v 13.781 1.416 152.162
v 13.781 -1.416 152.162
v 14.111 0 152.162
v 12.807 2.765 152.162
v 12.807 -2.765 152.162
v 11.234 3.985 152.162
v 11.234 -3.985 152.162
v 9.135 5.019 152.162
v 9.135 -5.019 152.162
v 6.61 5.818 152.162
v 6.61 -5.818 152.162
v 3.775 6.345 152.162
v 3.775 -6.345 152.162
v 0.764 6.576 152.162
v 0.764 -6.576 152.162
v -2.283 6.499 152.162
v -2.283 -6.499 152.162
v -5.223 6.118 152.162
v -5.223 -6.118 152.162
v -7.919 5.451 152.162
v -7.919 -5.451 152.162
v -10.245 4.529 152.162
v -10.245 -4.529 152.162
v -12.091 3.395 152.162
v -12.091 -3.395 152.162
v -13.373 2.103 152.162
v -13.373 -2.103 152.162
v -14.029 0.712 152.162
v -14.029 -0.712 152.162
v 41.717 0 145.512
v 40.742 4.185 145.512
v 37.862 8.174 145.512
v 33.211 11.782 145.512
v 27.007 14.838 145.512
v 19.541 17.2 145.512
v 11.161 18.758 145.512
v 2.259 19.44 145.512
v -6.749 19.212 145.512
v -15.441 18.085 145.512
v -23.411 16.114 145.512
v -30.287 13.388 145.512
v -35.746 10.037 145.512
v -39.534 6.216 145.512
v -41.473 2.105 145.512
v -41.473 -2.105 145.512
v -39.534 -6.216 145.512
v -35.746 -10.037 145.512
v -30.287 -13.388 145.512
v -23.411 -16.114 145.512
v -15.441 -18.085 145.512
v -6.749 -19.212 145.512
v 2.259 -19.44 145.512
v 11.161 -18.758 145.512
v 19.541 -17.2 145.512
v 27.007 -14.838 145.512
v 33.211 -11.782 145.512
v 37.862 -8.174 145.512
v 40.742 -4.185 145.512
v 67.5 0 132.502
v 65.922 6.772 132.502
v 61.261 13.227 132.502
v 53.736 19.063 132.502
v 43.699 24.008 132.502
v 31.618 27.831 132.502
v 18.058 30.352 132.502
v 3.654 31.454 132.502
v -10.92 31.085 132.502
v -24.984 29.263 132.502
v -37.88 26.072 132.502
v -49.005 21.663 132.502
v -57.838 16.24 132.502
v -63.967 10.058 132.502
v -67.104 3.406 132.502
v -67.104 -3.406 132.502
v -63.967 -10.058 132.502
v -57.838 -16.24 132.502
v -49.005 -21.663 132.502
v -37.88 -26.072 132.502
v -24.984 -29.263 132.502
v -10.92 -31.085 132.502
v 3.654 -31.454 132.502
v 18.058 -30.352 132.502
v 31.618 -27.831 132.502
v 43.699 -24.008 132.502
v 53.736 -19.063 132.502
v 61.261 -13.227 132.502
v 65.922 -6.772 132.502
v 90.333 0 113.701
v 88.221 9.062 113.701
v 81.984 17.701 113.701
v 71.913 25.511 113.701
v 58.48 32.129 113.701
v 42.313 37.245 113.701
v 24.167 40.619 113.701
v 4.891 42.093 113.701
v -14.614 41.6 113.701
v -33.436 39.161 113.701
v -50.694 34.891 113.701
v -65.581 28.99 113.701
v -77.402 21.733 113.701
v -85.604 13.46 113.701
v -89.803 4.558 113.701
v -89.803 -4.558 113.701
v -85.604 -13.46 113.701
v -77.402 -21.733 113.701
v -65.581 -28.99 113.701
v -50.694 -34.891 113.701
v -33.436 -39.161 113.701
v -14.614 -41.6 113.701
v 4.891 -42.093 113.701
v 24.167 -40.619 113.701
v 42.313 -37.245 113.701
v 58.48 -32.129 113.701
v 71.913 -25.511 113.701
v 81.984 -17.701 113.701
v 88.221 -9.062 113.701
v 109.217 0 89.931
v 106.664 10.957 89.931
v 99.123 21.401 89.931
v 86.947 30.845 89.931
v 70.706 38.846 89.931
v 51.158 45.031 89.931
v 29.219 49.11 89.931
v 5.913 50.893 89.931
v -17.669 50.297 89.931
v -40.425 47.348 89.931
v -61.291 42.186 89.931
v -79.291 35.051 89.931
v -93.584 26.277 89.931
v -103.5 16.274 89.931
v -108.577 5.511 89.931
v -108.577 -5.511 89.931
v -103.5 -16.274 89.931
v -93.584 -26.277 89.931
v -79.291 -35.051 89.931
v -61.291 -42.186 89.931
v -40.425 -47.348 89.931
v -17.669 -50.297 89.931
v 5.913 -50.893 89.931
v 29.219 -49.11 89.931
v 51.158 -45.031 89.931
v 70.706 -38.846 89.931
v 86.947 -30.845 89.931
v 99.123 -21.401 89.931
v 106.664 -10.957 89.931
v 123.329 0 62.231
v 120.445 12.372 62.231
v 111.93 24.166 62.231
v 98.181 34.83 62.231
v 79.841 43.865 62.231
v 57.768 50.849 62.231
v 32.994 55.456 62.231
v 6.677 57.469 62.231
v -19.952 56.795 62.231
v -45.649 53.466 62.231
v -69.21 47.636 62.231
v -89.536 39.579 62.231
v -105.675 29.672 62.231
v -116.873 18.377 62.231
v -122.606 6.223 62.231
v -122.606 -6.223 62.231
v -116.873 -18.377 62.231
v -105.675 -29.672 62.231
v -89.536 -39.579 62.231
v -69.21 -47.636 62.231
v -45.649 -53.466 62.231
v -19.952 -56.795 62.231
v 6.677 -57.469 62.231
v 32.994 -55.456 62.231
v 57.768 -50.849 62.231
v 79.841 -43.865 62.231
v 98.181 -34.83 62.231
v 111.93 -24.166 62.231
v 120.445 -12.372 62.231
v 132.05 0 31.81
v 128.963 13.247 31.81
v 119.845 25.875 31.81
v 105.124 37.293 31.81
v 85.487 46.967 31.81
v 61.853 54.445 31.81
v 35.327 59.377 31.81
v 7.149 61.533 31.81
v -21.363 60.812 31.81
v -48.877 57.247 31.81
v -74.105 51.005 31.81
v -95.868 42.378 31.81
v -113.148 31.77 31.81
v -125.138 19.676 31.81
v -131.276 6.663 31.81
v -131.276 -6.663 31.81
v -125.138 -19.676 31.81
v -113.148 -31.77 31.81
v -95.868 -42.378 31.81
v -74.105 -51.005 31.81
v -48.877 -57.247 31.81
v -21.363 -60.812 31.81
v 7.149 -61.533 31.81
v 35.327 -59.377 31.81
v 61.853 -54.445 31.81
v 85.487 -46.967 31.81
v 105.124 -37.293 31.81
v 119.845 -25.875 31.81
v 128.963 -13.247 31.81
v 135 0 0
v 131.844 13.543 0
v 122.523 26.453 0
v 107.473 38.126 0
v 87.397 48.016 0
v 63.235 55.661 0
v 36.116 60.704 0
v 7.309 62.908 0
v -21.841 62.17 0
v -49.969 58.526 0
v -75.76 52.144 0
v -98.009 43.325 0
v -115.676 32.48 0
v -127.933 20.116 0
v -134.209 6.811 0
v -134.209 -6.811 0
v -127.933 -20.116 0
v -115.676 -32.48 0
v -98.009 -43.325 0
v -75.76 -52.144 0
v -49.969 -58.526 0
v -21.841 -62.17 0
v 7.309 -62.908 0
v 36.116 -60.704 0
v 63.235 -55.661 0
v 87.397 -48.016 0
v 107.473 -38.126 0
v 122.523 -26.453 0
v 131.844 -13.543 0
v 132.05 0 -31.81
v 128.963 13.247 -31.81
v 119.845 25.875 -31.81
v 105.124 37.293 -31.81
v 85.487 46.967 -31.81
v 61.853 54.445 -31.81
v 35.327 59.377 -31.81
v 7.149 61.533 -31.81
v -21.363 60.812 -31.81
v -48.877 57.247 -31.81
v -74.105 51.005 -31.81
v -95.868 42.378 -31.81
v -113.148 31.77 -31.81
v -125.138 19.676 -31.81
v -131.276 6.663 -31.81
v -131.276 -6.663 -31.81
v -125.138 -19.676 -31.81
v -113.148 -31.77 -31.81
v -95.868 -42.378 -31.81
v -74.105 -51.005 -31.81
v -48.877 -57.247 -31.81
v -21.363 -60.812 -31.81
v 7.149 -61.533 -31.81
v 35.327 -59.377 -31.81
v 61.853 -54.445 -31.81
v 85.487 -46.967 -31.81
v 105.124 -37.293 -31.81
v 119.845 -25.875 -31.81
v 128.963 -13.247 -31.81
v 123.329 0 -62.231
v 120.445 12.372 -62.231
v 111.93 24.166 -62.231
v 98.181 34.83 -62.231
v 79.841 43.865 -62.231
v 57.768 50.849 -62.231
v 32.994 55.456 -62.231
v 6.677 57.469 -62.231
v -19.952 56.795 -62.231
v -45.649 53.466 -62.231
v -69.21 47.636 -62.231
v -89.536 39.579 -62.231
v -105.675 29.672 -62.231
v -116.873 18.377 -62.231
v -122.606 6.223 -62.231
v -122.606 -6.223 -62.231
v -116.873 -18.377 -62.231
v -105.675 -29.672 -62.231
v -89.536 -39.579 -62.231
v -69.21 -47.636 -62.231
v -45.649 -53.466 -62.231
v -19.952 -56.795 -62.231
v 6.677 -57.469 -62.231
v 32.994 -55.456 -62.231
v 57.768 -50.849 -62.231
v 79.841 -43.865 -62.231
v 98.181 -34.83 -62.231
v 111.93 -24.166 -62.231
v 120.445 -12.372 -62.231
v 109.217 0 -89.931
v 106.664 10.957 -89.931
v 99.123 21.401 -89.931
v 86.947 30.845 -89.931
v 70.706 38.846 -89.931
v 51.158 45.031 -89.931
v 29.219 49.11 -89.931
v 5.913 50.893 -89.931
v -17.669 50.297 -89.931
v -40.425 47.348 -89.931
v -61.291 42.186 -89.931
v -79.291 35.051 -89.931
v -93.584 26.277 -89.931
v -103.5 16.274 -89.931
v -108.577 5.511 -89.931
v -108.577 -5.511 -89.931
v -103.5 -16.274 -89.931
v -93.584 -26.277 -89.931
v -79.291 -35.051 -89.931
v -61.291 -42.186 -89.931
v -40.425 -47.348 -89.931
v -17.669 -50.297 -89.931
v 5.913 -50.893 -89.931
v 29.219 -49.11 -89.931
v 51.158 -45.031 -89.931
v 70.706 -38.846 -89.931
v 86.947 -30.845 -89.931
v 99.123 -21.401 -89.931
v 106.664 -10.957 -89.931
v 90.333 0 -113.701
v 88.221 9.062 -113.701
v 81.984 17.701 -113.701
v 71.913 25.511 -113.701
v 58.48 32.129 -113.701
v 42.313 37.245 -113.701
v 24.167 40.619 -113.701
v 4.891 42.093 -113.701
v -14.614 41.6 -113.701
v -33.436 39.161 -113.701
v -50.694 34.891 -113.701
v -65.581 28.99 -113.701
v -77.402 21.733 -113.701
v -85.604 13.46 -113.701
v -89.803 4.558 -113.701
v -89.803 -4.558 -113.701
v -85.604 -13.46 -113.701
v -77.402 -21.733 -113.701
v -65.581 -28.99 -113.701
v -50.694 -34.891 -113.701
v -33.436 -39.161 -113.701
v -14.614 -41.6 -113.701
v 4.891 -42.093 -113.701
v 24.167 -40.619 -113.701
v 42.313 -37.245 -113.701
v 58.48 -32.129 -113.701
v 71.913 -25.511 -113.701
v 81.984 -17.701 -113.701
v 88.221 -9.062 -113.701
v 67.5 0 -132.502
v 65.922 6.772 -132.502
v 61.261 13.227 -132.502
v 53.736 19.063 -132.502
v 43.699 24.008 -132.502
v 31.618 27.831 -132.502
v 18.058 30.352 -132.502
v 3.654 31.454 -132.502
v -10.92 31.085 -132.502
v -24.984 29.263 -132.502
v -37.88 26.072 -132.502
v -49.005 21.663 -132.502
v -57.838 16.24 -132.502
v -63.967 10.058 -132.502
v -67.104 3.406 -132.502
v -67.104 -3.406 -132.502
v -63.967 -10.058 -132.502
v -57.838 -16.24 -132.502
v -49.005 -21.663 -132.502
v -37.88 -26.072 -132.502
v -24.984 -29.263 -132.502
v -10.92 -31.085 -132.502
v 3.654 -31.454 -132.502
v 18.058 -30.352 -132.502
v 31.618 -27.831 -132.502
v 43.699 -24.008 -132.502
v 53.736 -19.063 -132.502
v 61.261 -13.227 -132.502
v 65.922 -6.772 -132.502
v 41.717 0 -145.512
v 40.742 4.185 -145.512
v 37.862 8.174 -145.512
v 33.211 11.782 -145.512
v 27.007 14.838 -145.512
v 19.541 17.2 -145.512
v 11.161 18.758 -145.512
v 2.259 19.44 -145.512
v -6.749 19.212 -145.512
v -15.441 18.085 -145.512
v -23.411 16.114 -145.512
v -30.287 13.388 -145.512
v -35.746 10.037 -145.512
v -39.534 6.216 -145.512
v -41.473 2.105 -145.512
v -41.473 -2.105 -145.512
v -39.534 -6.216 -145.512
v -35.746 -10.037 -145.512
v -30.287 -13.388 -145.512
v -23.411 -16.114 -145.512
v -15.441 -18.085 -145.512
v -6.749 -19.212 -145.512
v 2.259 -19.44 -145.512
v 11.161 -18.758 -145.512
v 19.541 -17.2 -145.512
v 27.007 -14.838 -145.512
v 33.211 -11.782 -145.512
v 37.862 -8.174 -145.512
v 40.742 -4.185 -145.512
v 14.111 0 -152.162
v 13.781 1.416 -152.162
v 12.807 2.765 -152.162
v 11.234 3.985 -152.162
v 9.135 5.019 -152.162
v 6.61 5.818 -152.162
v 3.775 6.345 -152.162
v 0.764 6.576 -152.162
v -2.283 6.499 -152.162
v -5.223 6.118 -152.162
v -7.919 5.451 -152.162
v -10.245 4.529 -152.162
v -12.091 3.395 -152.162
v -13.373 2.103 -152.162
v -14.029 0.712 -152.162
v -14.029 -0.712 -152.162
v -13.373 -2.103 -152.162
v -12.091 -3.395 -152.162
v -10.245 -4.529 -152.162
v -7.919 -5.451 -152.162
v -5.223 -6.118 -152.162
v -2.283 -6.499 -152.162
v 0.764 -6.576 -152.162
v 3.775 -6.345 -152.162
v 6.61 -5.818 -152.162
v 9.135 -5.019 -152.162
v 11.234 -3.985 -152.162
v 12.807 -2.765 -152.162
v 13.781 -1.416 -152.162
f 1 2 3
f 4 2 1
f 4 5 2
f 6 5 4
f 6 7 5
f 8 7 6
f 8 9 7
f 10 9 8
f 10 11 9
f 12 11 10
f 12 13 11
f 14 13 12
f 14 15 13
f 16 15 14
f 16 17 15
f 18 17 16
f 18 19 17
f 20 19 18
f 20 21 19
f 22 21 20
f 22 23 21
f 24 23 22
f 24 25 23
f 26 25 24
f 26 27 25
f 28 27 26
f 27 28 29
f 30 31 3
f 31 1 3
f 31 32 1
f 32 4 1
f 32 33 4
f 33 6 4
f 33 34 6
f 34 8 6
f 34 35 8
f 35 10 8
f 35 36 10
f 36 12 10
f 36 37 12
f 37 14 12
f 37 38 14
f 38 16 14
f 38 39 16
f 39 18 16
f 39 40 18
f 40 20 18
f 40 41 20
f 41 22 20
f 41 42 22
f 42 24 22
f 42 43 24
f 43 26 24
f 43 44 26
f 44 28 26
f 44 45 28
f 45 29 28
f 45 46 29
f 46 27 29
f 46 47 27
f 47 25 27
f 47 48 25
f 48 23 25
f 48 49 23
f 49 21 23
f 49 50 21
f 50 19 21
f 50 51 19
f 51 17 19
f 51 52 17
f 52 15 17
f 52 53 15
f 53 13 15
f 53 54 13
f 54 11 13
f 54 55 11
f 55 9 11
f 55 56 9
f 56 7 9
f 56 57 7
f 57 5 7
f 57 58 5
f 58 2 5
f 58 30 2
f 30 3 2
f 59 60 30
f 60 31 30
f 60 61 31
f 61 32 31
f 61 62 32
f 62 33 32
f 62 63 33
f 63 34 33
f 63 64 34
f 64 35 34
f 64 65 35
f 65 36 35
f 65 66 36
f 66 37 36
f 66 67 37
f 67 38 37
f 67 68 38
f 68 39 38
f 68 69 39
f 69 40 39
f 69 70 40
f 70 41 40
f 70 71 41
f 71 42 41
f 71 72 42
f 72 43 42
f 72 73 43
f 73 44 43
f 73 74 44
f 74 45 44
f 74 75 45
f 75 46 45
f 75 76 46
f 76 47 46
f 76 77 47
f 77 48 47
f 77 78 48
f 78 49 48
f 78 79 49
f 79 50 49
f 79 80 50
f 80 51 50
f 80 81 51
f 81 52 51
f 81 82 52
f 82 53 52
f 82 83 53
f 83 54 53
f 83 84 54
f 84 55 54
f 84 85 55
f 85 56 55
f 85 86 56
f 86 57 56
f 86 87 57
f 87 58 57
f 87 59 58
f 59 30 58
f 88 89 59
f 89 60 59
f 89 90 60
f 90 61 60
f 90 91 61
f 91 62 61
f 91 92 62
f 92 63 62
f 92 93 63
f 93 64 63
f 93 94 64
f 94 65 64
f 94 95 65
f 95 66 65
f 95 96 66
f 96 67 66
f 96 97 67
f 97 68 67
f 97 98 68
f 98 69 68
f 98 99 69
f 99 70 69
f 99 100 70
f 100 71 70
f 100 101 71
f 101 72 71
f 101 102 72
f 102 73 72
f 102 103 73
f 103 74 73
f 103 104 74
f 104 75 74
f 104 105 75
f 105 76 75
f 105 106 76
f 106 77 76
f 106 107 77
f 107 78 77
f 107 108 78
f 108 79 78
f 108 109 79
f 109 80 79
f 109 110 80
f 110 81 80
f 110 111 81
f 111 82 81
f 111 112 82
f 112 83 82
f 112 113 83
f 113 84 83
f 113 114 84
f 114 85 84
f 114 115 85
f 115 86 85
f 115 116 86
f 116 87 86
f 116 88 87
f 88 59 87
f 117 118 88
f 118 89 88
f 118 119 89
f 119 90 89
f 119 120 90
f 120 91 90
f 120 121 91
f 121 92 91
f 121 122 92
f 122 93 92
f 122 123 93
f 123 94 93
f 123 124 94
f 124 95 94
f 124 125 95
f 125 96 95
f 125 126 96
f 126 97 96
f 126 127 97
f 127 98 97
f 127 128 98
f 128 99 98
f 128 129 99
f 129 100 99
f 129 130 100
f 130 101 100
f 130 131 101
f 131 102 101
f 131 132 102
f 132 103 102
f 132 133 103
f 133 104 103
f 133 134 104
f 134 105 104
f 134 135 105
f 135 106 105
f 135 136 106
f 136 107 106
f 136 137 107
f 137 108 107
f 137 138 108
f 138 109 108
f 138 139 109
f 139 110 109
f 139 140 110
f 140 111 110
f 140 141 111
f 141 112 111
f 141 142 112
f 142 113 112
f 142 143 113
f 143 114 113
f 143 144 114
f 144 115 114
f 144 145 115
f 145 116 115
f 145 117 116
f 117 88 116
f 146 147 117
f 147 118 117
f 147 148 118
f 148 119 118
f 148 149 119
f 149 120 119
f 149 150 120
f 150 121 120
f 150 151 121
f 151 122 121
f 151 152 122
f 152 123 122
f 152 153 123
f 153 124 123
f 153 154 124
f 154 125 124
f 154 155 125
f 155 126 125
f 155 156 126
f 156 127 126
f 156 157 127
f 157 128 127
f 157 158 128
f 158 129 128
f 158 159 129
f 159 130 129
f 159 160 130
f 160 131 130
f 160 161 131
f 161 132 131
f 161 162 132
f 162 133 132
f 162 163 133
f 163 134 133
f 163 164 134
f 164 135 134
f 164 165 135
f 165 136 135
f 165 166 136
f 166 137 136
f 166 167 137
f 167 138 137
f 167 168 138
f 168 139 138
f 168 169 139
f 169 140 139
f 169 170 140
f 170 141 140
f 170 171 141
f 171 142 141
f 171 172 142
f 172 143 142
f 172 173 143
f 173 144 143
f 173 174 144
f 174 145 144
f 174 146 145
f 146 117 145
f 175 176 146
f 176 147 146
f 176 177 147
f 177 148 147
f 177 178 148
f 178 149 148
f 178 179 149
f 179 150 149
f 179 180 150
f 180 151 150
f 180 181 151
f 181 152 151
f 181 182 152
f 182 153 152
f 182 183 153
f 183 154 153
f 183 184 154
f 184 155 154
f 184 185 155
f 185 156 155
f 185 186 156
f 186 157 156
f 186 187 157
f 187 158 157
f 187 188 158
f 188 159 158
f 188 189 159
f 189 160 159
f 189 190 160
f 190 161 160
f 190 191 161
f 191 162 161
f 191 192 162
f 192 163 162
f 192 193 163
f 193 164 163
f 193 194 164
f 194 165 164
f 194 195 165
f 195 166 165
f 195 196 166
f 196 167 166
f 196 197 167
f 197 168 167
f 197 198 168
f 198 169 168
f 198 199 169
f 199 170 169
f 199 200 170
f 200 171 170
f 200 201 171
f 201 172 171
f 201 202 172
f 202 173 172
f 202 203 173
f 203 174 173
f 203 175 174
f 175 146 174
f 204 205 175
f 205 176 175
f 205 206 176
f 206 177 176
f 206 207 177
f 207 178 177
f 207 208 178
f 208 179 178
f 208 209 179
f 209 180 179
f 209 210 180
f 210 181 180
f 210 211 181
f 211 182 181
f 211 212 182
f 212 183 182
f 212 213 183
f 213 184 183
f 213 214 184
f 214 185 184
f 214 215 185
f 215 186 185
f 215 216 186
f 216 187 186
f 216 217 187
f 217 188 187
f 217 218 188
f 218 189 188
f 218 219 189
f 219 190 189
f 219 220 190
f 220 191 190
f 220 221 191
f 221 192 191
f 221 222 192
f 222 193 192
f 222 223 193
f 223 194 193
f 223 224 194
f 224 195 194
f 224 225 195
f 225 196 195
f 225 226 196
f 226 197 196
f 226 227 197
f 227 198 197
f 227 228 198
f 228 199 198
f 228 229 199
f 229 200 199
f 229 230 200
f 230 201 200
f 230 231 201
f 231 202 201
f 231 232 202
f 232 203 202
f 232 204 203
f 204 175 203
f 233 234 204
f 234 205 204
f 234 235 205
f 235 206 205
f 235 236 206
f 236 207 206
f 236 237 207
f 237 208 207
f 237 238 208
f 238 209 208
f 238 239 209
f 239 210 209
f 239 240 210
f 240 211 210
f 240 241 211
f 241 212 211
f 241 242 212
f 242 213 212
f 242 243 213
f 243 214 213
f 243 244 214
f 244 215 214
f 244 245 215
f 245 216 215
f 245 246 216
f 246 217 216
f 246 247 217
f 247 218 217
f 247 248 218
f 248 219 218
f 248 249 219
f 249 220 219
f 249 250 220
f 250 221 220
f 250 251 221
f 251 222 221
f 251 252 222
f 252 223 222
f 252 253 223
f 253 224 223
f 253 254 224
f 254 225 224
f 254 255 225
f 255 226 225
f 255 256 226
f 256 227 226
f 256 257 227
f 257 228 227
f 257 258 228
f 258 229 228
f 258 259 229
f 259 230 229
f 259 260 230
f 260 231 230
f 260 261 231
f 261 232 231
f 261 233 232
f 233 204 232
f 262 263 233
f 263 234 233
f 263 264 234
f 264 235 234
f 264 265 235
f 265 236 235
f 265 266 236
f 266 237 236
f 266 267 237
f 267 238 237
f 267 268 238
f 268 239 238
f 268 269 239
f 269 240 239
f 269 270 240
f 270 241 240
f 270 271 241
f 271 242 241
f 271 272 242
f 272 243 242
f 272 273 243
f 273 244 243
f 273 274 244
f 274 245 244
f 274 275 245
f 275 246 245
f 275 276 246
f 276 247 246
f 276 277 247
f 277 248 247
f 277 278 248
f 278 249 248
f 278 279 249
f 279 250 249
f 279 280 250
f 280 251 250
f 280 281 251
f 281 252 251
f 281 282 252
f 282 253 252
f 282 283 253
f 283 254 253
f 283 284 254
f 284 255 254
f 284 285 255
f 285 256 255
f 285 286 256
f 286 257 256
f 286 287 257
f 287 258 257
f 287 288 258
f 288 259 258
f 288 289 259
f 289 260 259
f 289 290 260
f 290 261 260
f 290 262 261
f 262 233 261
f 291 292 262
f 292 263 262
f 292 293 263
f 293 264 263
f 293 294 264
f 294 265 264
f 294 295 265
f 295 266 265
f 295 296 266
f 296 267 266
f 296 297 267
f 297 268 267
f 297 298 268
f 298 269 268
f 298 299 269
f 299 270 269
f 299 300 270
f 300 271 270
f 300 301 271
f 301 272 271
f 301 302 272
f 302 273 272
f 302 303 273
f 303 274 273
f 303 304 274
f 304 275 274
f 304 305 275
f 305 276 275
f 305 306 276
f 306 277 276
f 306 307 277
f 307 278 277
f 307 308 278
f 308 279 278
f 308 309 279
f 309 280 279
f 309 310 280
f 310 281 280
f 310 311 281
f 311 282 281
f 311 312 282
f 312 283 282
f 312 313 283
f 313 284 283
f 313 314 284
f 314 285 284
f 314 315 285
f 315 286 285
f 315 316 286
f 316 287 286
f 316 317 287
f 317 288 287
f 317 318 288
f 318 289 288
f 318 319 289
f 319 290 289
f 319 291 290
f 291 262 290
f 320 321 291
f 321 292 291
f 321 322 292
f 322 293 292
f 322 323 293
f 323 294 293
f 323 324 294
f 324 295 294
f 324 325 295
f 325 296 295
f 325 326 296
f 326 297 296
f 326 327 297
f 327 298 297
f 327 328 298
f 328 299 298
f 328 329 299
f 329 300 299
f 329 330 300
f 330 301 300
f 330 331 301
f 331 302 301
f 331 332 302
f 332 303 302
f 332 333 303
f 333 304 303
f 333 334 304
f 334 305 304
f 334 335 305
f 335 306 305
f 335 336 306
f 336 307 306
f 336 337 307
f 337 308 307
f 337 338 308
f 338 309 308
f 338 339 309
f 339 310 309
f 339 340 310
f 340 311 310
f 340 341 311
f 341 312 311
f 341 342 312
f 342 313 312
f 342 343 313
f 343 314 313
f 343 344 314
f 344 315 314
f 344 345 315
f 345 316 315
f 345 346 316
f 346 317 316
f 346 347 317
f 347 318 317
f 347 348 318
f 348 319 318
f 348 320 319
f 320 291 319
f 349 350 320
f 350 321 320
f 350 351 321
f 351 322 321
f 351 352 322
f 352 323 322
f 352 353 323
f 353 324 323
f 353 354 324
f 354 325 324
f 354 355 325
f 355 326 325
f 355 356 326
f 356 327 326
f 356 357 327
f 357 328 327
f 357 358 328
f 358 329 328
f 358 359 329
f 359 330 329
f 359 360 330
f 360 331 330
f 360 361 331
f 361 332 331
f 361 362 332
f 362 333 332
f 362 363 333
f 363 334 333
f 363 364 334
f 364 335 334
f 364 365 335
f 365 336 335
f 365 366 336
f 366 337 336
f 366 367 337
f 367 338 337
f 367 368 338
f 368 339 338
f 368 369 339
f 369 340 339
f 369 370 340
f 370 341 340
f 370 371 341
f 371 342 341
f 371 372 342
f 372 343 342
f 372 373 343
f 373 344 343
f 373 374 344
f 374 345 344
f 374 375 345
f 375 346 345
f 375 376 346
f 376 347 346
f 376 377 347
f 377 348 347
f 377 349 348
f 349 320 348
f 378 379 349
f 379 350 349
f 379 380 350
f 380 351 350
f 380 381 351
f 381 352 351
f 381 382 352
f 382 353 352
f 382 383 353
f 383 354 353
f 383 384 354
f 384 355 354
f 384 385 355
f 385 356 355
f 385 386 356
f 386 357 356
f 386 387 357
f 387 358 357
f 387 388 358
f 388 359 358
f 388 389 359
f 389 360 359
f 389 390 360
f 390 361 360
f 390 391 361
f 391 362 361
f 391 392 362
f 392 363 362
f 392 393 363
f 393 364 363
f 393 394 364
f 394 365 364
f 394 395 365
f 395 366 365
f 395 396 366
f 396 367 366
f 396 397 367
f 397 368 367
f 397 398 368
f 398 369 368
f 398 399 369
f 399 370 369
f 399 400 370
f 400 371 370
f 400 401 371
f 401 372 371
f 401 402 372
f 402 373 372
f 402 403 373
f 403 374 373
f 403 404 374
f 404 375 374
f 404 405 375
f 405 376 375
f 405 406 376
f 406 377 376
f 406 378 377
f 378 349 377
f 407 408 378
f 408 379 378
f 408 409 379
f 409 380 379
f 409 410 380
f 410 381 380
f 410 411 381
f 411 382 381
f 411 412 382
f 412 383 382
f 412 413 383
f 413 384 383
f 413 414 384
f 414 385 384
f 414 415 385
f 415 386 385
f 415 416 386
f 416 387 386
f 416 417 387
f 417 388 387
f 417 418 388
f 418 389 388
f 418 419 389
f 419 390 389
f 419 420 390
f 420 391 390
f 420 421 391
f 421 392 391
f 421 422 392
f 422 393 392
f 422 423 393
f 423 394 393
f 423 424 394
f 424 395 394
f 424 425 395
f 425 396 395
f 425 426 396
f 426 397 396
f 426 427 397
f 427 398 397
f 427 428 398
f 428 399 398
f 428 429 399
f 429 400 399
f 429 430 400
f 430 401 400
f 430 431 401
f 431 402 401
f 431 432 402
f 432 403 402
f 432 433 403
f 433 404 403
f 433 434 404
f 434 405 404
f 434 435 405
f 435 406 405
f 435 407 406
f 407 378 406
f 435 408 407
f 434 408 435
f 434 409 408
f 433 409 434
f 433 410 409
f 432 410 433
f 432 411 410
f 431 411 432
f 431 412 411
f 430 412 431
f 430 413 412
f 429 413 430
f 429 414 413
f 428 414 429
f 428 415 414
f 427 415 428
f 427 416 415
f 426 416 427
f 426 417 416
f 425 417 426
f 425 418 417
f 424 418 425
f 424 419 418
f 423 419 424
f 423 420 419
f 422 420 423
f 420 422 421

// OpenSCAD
// Generated by SolidPython 1.0.1 on 2020-07-29 00:46:51


scale(v = [15, 7, 17]) {
	sphere(r = 9);
}
/***********************************************
*********      SolidPython code:      **********
************************************************
 
# import packages: SolidPython
from solid import *
from solid.utils import *
from itertools import chain, combinations, permutations


class Resize:

    def __init__(self, scad_file):
        self.scad_file = scad_file
        #self.scad_file = import_scad(scad_file)
        # cone/cylinder param:
        self.r1 = 0
        self.r2 = 0
        self.h = 0
        # rectangular prism param:
        self.w = 0
        self.l = 0
        # ellipse param:
        self.r = 0

    # import OpenScad code (file name corresponds to shape)


    # classify shape + parameters
    def assign(self, param1, param2, param3):
        if self.scad_file == 'cone.scad':
            self.r1 = param1
            self.r2 = param2
            self.h = param3
        elif self.scad_file == 'cylinder.scad':
            self.r1 = param1
            self.r2 = param2
            self.h = param3
        elif self.scad_file == 'rectangularPrism.scad':
            self.h = param1
            self.l = param2
            self.w = param3
        else:
            self.r = param1
            self.h = param2

    # resize parameters
    def iterate(self):
        x = range(3, 20, 2)
        i = 1
        if self.scad_file == 'cone.scad':
            tempList = list(permutations(x, 2))
            for temp in tempList:
                param1 = temp[0]
                param2 = temp[1]
                filepath = 'produced_scad_files/' + 'cone' + str(param1) + '_' + str(param2) + '_' + '.scad'
                scad_render_to_file(cylinder(h=param1, r1=param2, r2=0), filepath)

        elif self.scad_file == 'cylinder.scad':
            tempList = list(permutations(x, 3))
            for temp in tempList:
                param1 = temp[0]
                param2 = temp[1]
                filepath = 'produced_scad_files/' + 'cylinder' + str(param1) + '_' + str(param2) + '_' + '.scad'
                scad_render_to_file(cylinder(h=param1, r1=param2, r2=param2), filepath)

        elif self.scad_file == 'rectangularPrism.scad':
            tempList = list(permutations(x, 3))
            for temp in tempList:
                param1 = temp[0]
                param2 = temp[1]
                param3 = temp[2]
                filepath = 'produced_scad_files/' + 'rectangularPrism' + str(param1) + '_' + str(param2) + '_' + str(
                    param3) + '.scad'
                scad_render_to_file(cube(size=(param1, param2, param3)), filepath)

        elif self.scad_file == 'ellipse.scad':
            tempList = list(permutations(x, 4))
            for temp in tempList:
                param1 = temp[0]
                param2 = temp[1]
                param3 = temp[2]
                param4 = temp[3]
                filepath = 'produced_scad_files/' + 'ellipse' + str(param1) + '_' + str(param2) + '_' + str(param3) + '_' + str(param4) + '.scad'
                scad_render_to_file(scale([param1, param2, param3])(sphere(r=param4)), filepath)

    def render_to_scadfile(self):
        scad_render_to_file(scad, 'example.scad') 
 
************************************************/
